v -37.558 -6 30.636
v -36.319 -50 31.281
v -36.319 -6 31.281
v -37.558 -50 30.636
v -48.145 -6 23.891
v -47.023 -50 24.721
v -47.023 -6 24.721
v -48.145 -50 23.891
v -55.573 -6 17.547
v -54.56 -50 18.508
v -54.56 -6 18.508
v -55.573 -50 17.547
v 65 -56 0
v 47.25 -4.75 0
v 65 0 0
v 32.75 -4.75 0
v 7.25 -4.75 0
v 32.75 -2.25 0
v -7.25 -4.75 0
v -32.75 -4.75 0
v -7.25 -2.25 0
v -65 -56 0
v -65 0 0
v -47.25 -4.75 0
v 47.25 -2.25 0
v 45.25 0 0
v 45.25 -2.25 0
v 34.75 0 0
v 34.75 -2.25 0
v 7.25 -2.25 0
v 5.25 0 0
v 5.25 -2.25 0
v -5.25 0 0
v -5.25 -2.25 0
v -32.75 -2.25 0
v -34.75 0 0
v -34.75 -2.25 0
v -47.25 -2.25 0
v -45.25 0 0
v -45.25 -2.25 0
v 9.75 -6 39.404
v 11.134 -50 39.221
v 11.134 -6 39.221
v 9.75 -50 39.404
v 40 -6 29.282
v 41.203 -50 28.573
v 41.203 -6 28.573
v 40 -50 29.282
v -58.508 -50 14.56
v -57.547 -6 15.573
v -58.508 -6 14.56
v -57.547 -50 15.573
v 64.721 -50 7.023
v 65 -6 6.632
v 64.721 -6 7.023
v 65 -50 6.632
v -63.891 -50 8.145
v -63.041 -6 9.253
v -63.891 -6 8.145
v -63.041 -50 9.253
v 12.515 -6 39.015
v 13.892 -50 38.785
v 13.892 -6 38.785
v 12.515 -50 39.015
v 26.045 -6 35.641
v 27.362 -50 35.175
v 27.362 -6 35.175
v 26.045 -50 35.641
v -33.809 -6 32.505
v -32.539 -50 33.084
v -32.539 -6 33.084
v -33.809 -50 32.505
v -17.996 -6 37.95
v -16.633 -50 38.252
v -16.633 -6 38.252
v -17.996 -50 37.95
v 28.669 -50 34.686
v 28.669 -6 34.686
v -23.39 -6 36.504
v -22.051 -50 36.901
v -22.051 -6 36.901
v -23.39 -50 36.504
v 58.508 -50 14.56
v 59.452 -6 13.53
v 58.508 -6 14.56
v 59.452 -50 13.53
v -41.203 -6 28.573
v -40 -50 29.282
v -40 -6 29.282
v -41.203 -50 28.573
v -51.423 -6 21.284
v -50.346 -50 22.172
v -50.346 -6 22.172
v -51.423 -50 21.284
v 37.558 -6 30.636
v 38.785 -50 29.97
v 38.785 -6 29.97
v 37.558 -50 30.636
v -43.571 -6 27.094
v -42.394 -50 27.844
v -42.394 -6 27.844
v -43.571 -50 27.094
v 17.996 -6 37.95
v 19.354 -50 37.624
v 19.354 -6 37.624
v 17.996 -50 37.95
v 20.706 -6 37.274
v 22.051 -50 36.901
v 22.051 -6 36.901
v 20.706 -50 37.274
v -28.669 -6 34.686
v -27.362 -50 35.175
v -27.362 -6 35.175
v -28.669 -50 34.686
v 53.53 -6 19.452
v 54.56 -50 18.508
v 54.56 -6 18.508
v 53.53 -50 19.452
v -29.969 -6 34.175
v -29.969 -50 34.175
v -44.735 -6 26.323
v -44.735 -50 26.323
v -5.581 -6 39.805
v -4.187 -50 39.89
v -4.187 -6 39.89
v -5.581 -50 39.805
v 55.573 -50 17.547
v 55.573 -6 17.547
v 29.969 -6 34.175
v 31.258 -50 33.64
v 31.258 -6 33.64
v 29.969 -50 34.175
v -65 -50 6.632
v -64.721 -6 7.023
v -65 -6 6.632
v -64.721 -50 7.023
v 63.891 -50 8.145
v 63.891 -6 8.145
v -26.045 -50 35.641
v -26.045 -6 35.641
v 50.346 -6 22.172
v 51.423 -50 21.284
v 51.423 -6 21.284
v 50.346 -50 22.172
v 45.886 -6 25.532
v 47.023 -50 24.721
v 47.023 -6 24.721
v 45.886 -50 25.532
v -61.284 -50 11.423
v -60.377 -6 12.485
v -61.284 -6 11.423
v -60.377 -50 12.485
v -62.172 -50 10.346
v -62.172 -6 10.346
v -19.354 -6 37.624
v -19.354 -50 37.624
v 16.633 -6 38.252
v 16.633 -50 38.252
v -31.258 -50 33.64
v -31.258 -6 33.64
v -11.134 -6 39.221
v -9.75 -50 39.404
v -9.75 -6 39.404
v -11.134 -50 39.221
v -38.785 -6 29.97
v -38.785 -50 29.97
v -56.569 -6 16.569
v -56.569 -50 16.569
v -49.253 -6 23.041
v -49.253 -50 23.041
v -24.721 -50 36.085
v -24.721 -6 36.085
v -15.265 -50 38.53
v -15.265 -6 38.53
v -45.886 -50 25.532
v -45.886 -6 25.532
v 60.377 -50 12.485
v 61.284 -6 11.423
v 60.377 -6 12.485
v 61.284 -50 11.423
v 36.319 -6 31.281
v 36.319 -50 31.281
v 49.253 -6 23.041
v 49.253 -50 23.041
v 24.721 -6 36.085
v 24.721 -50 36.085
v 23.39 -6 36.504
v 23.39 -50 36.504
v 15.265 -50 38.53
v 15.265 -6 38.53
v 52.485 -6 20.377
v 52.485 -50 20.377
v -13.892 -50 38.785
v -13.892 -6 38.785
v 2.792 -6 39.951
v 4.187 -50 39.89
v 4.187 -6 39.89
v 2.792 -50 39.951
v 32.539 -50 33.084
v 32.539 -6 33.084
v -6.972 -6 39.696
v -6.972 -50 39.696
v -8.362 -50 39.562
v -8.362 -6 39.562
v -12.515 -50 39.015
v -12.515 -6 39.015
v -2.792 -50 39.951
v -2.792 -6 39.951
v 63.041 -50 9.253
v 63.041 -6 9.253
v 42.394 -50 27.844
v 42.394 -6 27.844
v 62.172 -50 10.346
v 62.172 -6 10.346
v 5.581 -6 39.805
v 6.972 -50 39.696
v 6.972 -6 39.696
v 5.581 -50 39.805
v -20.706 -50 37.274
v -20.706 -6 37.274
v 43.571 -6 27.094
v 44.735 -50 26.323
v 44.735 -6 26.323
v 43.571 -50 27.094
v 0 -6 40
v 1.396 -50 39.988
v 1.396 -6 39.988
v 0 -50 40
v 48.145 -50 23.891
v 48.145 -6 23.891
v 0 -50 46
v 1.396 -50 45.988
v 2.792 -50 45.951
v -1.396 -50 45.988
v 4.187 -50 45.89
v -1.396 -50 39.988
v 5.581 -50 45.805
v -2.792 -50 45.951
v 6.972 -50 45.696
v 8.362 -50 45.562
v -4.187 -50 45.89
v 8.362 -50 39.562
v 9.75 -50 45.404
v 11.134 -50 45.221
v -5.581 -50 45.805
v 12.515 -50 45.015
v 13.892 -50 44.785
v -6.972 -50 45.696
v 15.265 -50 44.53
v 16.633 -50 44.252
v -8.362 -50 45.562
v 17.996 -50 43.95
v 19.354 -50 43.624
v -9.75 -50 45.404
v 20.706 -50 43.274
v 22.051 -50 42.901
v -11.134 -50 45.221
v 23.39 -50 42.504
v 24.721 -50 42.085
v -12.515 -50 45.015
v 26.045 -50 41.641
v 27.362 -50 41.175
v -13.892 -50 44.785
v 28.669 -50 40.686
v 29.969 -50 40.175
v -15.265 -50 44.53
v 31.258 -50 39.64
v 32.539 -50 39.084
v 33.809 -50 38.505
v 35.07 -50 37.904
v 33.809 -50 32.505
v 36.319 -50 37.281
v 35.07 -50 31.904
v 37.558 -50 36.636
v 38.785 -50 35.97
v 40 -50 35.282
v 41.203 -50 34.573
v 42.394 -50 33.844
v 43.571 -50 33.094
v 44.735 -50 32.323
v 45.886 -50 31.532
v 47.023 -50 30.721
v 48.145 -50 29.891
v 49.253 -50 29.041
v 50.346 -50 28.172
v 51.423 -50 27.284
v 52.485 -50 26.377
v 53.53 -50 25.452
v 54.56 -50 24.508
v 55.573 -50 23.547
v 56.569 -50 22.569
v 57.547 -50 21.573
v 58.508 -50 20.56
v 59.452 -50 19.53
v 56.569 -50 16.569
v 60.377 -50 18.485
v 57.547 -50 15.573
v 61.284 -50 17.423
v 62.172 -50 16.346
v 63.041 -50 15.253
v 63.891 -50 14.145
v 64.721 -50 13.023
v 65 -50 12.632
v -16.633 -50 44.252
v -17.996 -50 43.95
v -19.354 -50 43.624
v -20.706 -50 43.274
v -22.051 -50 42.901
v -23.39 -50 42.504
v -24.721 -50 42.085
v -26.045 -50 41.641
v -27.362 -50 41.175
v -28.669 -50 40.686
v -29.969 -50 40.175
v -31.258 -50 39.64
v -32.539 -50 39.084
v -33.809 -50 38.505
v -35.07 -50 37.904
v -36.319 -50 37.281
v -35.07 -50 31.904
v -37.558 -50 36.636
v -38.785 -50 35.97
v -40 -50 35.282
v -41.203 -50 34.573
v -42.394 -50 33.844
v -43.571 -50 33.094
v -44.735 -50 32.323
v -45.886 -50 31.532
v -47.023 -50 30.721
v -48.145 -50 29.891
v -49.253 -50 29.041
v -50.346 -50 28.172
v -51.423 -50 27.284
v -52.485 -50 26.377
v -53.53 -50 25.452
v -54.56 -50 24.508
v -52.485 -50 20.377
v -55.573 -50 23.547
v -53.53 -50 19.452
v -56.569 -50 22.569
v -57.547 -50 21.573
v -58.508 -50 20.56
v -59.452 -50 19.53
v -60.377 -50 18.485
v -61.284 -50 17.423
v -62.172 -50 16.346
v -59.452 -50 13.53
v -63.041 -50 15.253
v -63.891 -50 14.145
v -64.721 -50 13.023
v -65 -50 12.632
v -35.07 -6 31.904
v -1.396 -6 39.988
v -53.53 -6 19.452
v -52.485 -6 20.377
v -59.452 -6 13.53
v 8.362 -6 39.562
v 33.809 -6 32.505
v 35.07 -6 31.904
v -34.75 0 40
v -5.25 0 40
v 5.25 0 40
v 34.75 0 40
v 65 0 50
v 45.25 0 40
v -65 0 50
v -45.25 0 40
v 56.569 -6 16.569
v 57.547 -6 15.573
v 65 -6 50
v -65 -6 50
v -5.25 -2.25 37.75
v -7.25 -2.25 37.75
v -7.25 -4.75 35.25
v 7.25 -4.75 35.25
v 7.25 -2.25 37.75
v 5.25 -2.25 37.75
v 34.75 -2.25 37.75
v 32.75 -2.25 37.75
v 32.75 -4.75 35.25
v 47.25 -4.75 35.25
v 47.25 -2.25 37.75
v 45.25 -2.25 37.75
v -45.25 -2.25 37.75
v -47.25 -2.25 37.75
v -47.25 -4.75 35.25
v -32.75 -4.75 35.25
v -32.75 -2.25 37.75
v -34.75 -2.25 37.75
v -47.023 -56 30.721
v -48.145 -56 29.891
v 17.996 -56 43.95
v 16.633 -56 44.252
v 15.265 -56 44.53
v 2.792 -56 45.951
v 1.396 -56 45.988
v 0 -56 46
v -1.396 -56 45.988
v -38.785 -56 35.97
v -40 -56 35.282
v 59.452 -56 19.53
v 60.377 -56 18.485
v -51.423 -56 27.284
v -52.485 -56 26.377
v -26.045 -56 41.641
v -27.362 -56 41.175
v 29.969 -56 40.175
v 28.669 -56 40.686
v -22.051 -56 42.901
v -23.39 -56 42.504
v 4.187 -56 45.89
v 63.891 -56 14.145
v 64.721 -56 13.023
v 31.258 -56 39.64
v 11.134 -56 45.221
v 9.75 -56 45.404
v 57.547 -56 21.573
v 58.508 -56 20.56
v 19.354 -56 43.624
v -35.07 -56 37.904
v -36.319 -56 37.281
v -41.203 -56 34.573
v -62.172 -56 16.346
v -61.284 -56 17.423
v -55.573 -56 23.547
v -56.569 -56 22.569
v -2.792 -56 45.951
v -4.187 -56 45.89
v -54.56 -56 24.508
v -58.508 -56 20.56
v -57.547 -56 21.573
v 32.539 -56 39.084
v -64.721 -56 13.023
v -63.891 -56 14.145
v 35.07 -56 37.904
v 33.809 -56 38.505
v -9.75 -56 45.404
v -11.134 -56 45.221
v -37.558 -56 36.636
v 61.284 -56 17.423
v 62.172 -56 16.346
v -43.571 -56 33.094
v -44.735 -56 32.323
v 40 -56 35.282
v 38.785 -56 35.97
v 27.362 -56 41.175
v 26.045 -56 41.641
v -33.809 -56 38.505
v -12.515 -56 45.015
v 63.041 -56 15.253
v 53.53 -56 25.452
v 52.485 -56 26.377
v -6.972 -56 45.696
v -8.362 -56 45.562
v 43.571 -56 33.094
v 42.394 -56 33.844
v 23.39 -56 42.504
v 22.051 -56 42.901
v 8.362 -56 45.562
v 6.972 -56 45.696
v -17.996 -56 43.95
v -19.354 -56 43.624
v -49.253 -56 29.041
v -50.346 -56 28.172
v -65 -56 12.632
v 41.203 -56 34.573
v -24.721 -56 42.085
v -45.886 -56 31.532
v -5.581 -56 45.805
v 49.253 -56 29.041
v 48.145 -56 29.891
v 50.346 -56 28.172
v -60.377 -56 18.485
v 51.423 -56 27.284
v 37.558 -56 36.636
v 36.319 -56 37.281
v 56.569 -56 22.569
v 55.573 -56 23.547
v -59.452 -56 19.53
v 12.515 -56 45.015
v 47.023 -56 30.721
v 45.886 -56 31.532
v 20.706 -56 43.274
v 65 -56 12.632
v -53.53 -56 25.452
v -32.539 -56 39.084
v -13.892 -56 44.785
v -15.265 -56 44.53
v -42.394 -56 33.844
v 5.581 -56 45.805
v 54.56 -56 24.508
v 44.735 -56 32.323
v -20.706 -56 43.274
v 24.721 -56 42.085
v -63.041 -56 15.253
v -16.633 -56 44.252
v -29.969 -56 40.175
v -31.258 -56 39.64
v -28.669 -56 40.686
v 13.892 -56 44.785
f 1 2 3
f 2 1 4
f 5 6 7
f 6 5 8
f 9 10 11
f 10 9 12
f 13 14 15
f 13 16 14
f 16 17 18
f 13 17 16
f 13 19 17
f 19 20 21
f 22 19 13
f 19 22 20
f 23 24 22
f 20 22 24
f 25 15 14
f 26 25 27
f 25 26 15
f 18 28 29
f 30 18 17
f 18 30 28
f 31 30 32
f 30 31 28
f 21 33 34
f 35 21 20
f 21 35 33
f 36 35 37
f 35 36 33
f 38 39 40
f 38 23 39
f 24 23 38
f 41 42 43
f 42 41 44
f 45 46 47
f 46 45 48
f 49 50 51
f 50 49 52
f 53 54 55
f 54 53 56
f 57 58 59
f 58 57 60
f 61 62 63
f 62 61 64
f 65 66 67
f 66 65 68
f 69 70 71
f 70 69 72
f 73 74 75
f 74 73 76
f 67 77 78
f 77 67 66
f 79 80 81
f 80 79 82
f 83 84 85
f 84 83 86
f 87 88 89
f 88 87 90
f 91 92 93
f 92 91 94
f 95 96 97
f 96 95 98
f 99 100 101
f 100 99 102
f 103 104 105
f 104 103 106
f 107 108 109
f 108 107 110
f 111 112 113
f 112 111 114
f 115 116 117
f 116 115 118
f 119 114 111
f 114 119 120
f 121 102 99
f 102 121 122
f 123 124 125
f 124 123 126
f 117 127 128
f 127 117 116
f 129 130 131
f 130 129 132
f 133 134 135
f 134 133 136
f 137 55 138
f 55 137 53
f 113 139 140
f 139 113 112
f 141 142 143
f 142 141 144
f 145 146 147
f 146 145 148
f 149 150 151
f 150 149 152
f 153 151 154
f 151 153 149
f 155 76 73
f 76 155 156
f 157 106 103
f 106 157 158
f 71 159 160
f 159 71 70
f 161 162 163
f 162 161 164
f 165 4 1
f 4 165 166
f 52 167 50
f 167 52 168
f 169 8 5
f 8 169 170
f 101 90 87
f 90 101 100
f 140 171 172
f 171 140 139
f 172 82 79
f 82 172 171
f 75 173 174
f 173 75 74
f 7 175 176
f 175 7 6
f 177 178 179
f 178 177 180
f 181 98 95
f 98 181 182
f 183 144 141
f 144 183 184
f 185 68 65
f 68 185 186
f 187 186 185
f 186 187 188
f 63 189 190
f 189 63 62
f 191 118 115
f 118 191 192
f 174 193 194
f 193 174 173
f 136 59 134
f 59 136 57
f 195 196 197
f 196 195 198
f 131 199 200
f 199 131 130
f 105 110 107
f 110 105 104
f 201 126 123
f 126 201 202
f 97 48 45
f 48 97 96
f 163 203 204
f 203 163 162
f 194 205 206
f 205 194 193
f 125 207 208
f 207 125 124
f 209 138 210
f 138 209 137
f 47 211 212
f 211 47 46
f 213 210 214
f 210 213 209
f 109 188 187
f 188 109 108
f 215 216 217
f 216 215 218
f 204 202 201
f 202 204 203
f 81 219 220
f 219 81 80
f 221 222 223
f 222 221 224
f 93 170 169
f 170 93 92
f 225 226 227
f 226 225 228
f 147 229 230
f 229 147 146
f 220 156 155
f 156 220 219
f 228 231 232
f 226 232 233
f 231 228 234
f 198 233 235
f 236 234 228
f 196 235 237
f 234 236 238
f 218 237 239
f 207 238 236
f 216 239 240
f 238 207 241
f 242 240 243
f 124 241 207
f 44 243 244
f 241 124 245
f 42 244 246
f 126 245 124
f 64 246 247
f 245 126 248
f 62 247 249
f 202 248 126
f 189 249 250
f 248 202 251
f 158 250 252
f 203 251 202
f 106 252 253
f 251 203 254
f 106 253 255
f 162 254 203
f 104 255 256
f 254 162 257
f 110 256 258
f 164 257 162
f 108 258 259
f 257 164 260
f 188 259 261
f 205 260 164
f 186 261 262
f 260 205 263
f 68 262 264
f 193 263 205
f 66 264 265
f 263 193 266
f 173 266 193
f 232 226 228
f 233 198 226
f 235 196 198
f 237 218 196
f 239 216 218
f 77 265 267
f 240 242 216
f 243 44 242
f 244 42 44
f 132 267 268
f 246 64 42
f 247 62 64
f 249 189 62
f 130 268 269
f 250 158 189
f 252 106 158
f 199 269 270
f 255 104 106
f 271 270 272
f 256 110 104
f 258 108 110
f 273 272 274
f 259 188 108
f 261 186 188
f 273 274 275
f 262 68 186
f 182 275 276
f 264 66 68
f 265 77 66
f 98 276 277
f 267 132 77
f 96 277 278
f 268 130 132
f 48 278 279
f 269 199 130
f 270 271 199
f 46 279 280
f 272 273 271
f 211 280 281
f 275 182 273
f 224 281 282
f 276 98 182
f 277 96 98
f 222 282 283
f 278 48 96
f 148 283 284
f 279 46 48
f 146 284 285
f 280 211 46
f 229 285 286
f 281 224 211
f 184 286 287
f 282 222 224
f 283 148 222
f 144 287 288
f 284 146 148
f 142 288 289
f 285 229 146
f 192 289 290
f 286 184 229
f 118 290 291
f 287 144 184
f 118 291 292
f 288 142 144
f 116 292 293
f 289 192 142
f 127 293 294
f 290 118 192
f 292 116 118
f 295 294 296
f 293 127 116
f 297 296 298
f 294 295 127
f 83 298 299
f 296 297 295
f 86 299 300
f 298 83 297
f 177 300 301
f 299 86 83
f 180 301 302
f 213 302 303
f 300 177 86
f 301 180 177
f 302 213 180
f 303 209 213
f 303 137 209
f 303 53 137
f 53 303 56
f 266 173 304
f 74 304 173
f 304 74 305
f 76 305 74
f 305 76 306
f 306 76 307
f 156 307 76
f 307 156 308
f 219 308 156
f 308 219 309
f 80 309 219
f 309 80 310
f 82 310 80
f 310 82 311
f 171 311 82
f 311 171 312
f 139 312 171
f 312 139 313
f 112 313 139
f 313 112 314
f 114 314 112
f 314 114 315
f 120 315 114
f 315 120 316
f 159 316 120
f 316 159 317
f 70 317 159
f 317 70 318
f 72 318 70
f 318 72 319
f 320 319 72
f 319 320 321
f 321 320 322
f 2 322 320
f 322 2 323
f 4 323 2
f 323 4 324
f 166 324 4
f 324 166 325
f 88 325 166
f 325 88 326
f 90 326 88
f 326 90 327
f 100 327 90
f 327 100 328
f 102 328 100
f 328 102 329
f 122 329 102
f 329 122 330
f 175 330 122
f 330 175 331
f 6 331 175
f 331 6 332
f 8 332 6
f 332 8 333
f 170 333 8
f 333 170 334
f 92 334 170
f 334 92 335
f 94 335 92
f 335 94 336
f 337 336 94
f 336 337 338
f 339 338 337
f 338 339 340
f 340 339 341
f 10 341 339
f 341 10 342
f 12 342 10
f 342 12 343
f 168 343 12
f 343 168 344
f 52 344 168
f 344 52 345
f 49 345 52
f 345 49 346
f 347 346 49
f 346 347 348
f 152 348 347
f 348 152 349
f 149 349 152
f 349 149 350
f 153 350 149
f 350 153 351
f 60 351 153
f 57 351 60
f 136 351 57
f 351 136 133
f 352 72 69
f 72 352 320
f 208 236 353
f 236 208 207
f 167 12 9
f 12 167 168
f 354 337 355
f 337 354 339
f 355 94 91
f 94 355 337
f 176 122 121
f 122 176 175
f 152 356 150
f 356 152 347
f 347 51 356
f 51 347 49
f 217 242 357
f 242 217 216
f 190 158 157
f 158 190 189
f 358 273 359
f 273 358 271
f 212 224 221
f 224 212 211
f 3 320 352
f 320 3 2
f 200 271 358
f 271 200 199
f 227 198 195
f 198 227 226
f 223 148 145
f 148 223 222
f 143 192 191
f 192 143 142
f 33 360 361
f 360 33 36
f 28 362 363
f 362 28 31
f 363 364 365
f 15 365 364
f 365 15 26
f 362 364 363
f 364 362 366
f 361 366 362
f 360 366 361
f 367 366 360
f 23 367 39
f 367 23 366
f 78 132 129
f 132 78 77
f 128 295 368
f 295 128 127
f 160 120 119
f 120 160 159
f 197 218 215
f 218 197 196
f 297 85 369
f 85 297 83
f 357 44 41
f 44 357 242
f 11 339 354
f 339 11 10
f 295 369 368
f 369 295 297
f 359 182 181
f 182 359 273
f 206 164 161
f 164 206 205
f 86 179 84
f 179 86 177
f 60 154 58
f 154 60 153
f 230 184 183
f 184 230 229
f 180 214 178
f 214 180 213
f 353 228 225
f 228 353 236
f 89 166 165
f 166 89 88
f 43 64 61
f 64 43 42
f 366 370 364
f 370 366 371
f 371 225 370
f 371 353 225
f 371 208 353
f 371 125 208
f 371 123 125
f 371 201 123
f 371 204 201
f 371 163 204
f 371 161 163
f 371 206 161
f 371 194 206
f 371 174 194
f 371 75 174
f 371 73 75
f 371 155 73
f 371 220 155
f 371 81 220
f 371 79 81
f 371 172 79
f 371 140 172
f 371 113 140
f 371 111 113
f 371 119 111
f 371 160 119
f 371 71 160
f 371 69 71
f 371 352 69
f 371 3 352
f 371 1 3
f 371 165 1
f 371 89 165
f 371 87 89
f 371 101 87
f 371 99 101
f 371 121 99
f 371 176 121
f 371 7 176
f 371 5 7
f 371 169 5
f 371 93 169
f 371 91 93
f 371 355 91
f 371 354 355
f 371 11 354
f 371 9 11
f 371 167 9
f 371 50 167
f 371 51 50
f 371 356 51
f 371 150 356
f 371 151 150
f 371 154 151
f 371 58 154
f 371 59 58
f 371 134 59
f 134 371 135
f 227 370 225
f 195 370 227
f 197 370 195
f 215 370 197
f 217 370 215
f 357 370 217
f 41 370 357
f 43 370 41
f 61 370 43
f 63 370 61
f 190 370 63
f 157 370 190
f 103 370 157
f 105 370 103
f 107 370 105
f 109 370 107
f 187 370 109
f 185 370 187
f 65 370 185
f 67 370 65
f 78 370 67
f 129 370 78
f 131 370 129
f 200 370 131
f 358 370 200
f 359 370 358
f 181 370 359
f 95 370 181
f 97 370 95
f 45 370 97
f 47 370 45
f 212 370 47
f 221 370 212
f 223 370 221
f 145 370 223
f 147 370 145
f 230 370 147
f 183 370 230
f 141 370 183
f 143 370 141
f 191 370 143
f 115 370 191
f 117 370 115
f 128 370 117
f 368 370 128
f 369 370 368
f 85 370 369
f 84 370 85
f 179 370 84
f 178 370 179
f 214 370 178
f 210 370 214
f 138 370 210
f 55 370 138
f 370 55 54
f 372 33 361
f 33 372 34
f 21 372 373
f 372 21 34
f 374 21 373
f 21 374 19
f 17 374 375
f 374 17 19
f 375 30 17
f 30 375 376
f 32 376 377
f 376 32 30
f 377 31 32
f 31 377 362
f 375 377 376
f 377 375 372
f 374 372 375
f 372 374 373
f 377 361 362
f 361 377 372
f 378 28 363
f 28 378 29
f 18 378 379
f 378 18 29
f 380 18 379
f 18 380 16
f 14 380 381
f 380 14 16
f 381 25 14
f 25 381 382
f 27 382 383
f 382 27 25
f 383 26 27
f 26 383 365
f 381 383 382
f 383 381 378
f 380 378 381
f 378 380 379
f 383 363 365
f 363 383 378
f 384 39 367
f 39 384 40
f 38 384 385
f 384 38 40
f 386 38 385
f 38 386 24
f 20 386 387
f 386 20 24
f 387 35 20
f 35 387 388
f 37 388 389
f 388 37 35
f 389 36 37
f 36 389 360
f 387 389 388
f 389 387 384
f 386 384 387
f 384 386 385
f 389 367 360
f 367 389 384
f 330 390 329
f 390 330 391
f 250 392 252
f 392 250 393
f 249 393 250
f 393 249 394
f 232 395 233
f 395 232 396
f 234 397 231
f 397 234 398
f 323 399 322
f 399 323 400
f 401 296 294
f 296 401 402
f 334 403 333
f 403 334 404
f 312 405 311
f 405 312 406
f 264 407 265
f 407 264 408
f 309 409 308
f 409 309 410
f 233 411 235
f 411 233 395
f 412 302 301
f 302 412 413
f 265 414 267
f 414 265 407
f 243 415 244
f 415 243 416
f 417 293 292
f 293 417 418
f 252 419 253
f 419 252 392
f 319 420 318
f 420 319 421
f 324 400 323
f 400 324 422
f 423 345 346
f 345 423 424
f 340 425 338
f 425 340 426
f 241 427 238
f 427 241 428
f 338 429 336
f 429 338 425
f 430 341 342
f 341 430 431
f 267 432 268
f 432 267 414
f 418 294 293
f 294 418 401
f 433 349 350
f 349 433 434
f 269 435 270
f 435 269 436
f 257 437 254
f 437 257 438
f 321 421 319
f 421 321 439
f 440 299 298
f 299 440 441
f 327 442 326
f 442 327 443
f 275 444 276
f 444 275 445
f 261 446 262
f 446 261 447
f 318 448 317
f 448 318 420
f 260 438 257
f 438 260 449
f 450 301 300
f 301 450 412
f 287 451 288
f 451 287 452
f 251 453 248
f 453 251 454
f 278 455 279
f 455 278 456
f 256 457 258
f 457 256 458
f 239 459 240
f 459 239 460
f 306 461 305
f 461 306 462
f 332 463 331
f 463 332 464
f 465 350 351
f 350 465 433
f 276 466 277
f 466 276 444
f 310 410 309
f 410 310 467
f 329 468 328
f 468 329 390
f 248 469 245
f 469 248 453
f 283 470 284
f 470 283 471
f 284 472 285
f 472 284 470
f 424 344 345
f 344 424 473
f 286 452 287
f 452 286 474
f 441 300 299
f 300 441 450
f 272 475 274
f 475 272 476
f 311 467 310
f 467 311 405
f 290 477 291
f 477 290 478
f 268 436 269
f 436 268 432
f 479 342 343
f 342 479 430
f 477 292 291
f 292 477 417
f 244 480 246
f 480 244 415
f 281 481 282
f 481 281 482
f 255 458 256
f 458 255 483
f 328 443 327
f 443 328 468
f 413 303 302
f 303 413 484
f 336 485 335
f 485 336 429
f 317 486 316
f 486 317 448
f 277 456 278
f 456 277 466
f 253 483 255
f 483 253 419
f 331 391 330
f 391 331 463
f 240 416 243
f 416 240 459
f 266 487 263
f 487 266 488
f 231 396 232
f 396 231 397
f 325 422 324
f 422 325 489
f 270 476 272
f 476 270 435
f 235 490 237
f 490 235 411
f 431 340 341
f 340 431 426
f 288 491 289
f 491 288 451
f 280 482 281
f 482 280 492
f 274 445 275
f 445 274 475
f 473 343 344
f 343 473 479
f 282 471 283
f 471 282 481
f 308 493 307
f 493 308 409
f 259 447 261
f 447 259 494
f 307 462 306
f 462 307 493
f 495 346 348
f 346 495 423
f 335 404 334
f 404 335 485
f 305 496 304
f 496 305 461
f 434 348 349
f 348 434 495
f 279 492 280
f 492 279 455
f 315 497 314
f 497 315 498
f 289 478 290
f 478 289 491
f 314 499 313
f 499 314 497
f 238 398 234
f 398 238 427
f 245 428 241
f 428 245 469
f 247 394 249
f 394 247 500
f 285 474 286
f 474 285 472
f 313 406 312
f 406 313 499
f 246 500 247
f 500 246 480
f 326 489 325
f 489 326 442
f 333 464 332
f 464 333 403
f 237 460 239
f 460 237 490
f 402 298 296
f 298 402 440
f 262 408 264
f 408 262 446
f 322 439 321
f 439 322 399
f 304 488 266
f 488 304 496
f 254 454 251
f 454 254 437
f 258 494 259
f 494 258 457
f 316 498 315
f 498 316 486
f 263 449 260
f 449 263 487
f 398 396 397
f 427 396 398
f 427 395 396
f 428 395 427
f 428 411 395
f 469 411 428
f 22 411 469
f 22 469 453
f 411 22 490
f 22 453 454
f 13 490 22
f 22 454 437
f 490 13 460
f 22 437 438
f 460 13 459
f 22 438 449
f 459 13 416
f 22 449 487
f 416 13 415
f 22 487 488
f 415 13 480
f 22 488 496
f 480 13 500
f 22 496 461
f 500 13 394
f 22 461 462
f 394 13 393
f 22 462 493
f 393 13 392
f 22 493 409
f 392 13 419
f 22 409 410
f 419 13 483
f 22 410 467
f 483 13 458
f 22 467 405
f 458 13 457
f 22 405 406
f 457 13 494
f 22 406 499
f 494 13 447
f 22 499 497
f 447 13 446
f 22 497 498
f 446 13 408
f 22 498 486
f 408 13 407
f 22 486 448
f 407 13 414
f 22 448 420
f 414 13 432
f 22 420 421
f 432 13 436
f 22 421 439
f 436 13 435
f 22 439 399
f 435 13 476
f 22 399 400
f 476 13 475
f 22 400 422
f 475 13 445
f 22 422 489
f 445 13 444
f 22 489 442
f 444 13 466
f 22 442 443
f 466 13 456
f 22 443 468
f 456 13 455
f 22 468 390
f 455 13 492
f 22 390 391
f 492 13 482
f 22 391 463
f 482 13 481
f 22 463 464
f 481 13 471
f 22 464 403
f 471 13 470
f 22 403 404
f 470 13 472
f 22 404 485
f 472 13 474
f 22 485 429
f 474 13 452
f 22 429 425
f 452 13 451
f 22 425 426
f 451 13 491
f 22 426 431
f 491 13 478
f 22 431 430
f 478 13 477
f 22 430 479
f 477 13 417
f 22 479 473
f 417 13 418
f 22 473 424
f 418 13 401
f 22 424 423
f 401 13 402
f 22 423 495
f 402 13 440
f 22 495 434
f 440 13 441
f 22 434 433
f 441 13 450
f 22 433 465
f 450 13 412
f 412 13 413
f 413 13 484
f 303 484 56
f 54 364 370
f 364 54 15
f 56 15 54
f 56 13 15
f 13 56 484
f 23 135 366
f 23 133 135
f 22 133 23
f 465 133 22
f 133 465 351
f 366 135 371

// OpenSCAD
// file: ../skadis-hook-adapter/skadis-hook-adapter-slot.scad
include <../utils/skadis/constants.scad>

$fn = 100;

module skadis_hook_adapter_slot(
height,
base_tolerance = 0.5,
screw_hole_diameter = 3.5,
screw_hole_depth = 10
) {
    inner_width = SKADIS_HOOK_ADAPTER_INNER_WIDTH + base_tolerance;
    outer_width = SKADIS_HOOK_ADAPTER_OUTER_WIDTH + base_tolerance;
    inner_depth = SKADIS_HOOK_ADAPTER_INNER_DEPTH + base_tolerance;
    outer_depth = SKADIS_HOOK_ADAPTER_OUTER_DEPTH + base_tolerance / 2;

    combined_depth = inner_depth + outer_depth;

    difference() {
        linear_extrude(height) {
            translate([-outer_width / 2, 0]) {
                square([outer_width, outer_depth]);
            }
            translate([-inner_width / 2, outer_depth]) {
                square([inner_width, inner_depth]);
            }
        }

        // triangular top on cut outs to make printing easier
        #translate([-inner_width / 2, combined_depth, height - combined_depth]) {
            rotate(-90, [0, 1, 0]) {
                rotate(180, [1, 0, 0]) {
                    linear_extrude(inner_width) {
                        polygon(points = [
                                [0, 0],
                                [combined_depth, 0],
                                [combined_depth, combined_depth],
                            ]);
                    }
                }
            }
        }
    }


    // screw hole
    #translate([0, combined_depth + 10, height - 10]) {
        rotate(90, [1, 0, 0]) {
            linear_extrude(10) {
                circle(d = screw_hole_diameter);
            }
        }
    }
}

//skadis_hook_adapter_slot(50);
// file: ../utils/skadis/constants.scad
SKADIS_HOLE_TO_HOLE_DISTANCE = 40;
SKADIS_HOLE_WIDTH = 5;
SKADIS_HOLE_HEIGHT = 10; // excluding the rounded edges
SKADIS_HOLE_DEPTH = 6;
SKADIS_HOOK_ADAPTER_OUTER_WIDTH = 10;
SKADIS_HOOK_ADAPTER_INNER_WIDTH = 14;
SKADIS_HOOK_ADAPTER_OUTER_DEPTH = 2;
SKADIS_HOOK_ADAPTER_INNER_DEPTH = 2;
// file: ../utils/misc.scad
module rounded_rectangle(width, height, corner_radius, center = false) {

    x_offset = center ? -width/2 : 0;
    y_offset = center ? -height/2 : 0;

    corners_points = [
            [corner_radius, corner_radius],
            [width - corner_radius, corner_radius],
            [width - corner_radius, height - corner_radius],
            [corner_radius, height - corner_radius],
        ];

    hull() {
        for (p = corners_points) {
            translate([p.x + x_offset, p.y + y_offset, -1])
                circle(corner_radius);
        }
    }
}


module circle_segment(radius, cut_off_height) {
    intersection() {
        translate([0, -cut_off_height]) {
            circle(radius);
        }
        translate([-radius, 0]) {
            square([radius * 2, cut_off_height * 2]);
        }
    }
}

module tear_drop_circle(d) {
    r = d / 2;
    angle = 30;
    offset_y = r / 2;
    offset_x = cos(angle) * r;

    triangle_points = [
            [-offset_x, r / 2],
            [offset_x, r / 2],
            [0, 3 / 2 * r]
        ];

    polygon(triangle_points);
    circle(d = d);

}
// main file
use <../utils/misc.scad>
use <../utils/skadis/constants.scad>
include <../skadis-hook-adapter/skadis-hook-adapter-slot.scad>

mount_radius = 80;
mount_height = 40;
mount_depth = 50;
mount_back_wall_depth = 6;
mount_back_wall_width = 140;
mount_back_wall_height = 50;
mount_front_wall_depth = 6;
mount_front_wall_height = 6;

total_depth = mount_back_wall_depth + mount_depth + mount_front_wall_depth;
hook_adapter_slot_height = mount_back_wall_height - 10;

bounding_box = [
    130,
    total_depth,
    mount_back_wall_height
    ];

skadis_headpone_mount();

$fn = 360;

module skadis_headpone_mount() {
    intersection() {
        union() {
            difference() {
                union() {
                    // main body
                    rotate(90, [1, 0, 0]) {
                        linear_extrude(mount_depth) {
                            circle_segment(mount_radius, mount_height);
                        }
                    }

                    // back wall
                    translate([-mount_back_wall_width / 2, -mount_back_wall_depth]) {
                        linear_extrude(mount_back_wall_height) {
                            square([mount_back_wall_width, mount_back_wall_depth]);
                        }
                    }
                }

                // hook slots
                rotate(180) {
                    translate([0, 0]) {
                        #skadis_hook_adapter_slot(hook_adapter_slot_height, screw_hole_diameter = 0);
                    }
                    translate([-SKADIS_HOLE_TO_HOLE_DISTANCE, 0]) {
                        #skadis_hook_adapter_slot(hook_adapter_slot_height, screw_hole_diameter = 0);
                    }
                    translate([+SKADIS_HOLE_TO_HOLE_DISTANCE, 0]) {
                        #skadis_hook_adapter_slot(hook_adapter_slot_height, screw_hole_diameter = 0);
                    }
                }
            }

            // front wall
            translate([0, -mount_depth]) {
                rotate(90, [1, 0, 0]) {
                    linear_extrude(mount_front_wall_depth) {
                        circle_segment(mount_radius, mount_height - mount_front_wall_height);
                    }
                }
            }
        }

        // bounding box
        translate([-bounding_box.x/2, -bounding_box.y]) {
            #cube(bounding_box);
        }
    }
}
